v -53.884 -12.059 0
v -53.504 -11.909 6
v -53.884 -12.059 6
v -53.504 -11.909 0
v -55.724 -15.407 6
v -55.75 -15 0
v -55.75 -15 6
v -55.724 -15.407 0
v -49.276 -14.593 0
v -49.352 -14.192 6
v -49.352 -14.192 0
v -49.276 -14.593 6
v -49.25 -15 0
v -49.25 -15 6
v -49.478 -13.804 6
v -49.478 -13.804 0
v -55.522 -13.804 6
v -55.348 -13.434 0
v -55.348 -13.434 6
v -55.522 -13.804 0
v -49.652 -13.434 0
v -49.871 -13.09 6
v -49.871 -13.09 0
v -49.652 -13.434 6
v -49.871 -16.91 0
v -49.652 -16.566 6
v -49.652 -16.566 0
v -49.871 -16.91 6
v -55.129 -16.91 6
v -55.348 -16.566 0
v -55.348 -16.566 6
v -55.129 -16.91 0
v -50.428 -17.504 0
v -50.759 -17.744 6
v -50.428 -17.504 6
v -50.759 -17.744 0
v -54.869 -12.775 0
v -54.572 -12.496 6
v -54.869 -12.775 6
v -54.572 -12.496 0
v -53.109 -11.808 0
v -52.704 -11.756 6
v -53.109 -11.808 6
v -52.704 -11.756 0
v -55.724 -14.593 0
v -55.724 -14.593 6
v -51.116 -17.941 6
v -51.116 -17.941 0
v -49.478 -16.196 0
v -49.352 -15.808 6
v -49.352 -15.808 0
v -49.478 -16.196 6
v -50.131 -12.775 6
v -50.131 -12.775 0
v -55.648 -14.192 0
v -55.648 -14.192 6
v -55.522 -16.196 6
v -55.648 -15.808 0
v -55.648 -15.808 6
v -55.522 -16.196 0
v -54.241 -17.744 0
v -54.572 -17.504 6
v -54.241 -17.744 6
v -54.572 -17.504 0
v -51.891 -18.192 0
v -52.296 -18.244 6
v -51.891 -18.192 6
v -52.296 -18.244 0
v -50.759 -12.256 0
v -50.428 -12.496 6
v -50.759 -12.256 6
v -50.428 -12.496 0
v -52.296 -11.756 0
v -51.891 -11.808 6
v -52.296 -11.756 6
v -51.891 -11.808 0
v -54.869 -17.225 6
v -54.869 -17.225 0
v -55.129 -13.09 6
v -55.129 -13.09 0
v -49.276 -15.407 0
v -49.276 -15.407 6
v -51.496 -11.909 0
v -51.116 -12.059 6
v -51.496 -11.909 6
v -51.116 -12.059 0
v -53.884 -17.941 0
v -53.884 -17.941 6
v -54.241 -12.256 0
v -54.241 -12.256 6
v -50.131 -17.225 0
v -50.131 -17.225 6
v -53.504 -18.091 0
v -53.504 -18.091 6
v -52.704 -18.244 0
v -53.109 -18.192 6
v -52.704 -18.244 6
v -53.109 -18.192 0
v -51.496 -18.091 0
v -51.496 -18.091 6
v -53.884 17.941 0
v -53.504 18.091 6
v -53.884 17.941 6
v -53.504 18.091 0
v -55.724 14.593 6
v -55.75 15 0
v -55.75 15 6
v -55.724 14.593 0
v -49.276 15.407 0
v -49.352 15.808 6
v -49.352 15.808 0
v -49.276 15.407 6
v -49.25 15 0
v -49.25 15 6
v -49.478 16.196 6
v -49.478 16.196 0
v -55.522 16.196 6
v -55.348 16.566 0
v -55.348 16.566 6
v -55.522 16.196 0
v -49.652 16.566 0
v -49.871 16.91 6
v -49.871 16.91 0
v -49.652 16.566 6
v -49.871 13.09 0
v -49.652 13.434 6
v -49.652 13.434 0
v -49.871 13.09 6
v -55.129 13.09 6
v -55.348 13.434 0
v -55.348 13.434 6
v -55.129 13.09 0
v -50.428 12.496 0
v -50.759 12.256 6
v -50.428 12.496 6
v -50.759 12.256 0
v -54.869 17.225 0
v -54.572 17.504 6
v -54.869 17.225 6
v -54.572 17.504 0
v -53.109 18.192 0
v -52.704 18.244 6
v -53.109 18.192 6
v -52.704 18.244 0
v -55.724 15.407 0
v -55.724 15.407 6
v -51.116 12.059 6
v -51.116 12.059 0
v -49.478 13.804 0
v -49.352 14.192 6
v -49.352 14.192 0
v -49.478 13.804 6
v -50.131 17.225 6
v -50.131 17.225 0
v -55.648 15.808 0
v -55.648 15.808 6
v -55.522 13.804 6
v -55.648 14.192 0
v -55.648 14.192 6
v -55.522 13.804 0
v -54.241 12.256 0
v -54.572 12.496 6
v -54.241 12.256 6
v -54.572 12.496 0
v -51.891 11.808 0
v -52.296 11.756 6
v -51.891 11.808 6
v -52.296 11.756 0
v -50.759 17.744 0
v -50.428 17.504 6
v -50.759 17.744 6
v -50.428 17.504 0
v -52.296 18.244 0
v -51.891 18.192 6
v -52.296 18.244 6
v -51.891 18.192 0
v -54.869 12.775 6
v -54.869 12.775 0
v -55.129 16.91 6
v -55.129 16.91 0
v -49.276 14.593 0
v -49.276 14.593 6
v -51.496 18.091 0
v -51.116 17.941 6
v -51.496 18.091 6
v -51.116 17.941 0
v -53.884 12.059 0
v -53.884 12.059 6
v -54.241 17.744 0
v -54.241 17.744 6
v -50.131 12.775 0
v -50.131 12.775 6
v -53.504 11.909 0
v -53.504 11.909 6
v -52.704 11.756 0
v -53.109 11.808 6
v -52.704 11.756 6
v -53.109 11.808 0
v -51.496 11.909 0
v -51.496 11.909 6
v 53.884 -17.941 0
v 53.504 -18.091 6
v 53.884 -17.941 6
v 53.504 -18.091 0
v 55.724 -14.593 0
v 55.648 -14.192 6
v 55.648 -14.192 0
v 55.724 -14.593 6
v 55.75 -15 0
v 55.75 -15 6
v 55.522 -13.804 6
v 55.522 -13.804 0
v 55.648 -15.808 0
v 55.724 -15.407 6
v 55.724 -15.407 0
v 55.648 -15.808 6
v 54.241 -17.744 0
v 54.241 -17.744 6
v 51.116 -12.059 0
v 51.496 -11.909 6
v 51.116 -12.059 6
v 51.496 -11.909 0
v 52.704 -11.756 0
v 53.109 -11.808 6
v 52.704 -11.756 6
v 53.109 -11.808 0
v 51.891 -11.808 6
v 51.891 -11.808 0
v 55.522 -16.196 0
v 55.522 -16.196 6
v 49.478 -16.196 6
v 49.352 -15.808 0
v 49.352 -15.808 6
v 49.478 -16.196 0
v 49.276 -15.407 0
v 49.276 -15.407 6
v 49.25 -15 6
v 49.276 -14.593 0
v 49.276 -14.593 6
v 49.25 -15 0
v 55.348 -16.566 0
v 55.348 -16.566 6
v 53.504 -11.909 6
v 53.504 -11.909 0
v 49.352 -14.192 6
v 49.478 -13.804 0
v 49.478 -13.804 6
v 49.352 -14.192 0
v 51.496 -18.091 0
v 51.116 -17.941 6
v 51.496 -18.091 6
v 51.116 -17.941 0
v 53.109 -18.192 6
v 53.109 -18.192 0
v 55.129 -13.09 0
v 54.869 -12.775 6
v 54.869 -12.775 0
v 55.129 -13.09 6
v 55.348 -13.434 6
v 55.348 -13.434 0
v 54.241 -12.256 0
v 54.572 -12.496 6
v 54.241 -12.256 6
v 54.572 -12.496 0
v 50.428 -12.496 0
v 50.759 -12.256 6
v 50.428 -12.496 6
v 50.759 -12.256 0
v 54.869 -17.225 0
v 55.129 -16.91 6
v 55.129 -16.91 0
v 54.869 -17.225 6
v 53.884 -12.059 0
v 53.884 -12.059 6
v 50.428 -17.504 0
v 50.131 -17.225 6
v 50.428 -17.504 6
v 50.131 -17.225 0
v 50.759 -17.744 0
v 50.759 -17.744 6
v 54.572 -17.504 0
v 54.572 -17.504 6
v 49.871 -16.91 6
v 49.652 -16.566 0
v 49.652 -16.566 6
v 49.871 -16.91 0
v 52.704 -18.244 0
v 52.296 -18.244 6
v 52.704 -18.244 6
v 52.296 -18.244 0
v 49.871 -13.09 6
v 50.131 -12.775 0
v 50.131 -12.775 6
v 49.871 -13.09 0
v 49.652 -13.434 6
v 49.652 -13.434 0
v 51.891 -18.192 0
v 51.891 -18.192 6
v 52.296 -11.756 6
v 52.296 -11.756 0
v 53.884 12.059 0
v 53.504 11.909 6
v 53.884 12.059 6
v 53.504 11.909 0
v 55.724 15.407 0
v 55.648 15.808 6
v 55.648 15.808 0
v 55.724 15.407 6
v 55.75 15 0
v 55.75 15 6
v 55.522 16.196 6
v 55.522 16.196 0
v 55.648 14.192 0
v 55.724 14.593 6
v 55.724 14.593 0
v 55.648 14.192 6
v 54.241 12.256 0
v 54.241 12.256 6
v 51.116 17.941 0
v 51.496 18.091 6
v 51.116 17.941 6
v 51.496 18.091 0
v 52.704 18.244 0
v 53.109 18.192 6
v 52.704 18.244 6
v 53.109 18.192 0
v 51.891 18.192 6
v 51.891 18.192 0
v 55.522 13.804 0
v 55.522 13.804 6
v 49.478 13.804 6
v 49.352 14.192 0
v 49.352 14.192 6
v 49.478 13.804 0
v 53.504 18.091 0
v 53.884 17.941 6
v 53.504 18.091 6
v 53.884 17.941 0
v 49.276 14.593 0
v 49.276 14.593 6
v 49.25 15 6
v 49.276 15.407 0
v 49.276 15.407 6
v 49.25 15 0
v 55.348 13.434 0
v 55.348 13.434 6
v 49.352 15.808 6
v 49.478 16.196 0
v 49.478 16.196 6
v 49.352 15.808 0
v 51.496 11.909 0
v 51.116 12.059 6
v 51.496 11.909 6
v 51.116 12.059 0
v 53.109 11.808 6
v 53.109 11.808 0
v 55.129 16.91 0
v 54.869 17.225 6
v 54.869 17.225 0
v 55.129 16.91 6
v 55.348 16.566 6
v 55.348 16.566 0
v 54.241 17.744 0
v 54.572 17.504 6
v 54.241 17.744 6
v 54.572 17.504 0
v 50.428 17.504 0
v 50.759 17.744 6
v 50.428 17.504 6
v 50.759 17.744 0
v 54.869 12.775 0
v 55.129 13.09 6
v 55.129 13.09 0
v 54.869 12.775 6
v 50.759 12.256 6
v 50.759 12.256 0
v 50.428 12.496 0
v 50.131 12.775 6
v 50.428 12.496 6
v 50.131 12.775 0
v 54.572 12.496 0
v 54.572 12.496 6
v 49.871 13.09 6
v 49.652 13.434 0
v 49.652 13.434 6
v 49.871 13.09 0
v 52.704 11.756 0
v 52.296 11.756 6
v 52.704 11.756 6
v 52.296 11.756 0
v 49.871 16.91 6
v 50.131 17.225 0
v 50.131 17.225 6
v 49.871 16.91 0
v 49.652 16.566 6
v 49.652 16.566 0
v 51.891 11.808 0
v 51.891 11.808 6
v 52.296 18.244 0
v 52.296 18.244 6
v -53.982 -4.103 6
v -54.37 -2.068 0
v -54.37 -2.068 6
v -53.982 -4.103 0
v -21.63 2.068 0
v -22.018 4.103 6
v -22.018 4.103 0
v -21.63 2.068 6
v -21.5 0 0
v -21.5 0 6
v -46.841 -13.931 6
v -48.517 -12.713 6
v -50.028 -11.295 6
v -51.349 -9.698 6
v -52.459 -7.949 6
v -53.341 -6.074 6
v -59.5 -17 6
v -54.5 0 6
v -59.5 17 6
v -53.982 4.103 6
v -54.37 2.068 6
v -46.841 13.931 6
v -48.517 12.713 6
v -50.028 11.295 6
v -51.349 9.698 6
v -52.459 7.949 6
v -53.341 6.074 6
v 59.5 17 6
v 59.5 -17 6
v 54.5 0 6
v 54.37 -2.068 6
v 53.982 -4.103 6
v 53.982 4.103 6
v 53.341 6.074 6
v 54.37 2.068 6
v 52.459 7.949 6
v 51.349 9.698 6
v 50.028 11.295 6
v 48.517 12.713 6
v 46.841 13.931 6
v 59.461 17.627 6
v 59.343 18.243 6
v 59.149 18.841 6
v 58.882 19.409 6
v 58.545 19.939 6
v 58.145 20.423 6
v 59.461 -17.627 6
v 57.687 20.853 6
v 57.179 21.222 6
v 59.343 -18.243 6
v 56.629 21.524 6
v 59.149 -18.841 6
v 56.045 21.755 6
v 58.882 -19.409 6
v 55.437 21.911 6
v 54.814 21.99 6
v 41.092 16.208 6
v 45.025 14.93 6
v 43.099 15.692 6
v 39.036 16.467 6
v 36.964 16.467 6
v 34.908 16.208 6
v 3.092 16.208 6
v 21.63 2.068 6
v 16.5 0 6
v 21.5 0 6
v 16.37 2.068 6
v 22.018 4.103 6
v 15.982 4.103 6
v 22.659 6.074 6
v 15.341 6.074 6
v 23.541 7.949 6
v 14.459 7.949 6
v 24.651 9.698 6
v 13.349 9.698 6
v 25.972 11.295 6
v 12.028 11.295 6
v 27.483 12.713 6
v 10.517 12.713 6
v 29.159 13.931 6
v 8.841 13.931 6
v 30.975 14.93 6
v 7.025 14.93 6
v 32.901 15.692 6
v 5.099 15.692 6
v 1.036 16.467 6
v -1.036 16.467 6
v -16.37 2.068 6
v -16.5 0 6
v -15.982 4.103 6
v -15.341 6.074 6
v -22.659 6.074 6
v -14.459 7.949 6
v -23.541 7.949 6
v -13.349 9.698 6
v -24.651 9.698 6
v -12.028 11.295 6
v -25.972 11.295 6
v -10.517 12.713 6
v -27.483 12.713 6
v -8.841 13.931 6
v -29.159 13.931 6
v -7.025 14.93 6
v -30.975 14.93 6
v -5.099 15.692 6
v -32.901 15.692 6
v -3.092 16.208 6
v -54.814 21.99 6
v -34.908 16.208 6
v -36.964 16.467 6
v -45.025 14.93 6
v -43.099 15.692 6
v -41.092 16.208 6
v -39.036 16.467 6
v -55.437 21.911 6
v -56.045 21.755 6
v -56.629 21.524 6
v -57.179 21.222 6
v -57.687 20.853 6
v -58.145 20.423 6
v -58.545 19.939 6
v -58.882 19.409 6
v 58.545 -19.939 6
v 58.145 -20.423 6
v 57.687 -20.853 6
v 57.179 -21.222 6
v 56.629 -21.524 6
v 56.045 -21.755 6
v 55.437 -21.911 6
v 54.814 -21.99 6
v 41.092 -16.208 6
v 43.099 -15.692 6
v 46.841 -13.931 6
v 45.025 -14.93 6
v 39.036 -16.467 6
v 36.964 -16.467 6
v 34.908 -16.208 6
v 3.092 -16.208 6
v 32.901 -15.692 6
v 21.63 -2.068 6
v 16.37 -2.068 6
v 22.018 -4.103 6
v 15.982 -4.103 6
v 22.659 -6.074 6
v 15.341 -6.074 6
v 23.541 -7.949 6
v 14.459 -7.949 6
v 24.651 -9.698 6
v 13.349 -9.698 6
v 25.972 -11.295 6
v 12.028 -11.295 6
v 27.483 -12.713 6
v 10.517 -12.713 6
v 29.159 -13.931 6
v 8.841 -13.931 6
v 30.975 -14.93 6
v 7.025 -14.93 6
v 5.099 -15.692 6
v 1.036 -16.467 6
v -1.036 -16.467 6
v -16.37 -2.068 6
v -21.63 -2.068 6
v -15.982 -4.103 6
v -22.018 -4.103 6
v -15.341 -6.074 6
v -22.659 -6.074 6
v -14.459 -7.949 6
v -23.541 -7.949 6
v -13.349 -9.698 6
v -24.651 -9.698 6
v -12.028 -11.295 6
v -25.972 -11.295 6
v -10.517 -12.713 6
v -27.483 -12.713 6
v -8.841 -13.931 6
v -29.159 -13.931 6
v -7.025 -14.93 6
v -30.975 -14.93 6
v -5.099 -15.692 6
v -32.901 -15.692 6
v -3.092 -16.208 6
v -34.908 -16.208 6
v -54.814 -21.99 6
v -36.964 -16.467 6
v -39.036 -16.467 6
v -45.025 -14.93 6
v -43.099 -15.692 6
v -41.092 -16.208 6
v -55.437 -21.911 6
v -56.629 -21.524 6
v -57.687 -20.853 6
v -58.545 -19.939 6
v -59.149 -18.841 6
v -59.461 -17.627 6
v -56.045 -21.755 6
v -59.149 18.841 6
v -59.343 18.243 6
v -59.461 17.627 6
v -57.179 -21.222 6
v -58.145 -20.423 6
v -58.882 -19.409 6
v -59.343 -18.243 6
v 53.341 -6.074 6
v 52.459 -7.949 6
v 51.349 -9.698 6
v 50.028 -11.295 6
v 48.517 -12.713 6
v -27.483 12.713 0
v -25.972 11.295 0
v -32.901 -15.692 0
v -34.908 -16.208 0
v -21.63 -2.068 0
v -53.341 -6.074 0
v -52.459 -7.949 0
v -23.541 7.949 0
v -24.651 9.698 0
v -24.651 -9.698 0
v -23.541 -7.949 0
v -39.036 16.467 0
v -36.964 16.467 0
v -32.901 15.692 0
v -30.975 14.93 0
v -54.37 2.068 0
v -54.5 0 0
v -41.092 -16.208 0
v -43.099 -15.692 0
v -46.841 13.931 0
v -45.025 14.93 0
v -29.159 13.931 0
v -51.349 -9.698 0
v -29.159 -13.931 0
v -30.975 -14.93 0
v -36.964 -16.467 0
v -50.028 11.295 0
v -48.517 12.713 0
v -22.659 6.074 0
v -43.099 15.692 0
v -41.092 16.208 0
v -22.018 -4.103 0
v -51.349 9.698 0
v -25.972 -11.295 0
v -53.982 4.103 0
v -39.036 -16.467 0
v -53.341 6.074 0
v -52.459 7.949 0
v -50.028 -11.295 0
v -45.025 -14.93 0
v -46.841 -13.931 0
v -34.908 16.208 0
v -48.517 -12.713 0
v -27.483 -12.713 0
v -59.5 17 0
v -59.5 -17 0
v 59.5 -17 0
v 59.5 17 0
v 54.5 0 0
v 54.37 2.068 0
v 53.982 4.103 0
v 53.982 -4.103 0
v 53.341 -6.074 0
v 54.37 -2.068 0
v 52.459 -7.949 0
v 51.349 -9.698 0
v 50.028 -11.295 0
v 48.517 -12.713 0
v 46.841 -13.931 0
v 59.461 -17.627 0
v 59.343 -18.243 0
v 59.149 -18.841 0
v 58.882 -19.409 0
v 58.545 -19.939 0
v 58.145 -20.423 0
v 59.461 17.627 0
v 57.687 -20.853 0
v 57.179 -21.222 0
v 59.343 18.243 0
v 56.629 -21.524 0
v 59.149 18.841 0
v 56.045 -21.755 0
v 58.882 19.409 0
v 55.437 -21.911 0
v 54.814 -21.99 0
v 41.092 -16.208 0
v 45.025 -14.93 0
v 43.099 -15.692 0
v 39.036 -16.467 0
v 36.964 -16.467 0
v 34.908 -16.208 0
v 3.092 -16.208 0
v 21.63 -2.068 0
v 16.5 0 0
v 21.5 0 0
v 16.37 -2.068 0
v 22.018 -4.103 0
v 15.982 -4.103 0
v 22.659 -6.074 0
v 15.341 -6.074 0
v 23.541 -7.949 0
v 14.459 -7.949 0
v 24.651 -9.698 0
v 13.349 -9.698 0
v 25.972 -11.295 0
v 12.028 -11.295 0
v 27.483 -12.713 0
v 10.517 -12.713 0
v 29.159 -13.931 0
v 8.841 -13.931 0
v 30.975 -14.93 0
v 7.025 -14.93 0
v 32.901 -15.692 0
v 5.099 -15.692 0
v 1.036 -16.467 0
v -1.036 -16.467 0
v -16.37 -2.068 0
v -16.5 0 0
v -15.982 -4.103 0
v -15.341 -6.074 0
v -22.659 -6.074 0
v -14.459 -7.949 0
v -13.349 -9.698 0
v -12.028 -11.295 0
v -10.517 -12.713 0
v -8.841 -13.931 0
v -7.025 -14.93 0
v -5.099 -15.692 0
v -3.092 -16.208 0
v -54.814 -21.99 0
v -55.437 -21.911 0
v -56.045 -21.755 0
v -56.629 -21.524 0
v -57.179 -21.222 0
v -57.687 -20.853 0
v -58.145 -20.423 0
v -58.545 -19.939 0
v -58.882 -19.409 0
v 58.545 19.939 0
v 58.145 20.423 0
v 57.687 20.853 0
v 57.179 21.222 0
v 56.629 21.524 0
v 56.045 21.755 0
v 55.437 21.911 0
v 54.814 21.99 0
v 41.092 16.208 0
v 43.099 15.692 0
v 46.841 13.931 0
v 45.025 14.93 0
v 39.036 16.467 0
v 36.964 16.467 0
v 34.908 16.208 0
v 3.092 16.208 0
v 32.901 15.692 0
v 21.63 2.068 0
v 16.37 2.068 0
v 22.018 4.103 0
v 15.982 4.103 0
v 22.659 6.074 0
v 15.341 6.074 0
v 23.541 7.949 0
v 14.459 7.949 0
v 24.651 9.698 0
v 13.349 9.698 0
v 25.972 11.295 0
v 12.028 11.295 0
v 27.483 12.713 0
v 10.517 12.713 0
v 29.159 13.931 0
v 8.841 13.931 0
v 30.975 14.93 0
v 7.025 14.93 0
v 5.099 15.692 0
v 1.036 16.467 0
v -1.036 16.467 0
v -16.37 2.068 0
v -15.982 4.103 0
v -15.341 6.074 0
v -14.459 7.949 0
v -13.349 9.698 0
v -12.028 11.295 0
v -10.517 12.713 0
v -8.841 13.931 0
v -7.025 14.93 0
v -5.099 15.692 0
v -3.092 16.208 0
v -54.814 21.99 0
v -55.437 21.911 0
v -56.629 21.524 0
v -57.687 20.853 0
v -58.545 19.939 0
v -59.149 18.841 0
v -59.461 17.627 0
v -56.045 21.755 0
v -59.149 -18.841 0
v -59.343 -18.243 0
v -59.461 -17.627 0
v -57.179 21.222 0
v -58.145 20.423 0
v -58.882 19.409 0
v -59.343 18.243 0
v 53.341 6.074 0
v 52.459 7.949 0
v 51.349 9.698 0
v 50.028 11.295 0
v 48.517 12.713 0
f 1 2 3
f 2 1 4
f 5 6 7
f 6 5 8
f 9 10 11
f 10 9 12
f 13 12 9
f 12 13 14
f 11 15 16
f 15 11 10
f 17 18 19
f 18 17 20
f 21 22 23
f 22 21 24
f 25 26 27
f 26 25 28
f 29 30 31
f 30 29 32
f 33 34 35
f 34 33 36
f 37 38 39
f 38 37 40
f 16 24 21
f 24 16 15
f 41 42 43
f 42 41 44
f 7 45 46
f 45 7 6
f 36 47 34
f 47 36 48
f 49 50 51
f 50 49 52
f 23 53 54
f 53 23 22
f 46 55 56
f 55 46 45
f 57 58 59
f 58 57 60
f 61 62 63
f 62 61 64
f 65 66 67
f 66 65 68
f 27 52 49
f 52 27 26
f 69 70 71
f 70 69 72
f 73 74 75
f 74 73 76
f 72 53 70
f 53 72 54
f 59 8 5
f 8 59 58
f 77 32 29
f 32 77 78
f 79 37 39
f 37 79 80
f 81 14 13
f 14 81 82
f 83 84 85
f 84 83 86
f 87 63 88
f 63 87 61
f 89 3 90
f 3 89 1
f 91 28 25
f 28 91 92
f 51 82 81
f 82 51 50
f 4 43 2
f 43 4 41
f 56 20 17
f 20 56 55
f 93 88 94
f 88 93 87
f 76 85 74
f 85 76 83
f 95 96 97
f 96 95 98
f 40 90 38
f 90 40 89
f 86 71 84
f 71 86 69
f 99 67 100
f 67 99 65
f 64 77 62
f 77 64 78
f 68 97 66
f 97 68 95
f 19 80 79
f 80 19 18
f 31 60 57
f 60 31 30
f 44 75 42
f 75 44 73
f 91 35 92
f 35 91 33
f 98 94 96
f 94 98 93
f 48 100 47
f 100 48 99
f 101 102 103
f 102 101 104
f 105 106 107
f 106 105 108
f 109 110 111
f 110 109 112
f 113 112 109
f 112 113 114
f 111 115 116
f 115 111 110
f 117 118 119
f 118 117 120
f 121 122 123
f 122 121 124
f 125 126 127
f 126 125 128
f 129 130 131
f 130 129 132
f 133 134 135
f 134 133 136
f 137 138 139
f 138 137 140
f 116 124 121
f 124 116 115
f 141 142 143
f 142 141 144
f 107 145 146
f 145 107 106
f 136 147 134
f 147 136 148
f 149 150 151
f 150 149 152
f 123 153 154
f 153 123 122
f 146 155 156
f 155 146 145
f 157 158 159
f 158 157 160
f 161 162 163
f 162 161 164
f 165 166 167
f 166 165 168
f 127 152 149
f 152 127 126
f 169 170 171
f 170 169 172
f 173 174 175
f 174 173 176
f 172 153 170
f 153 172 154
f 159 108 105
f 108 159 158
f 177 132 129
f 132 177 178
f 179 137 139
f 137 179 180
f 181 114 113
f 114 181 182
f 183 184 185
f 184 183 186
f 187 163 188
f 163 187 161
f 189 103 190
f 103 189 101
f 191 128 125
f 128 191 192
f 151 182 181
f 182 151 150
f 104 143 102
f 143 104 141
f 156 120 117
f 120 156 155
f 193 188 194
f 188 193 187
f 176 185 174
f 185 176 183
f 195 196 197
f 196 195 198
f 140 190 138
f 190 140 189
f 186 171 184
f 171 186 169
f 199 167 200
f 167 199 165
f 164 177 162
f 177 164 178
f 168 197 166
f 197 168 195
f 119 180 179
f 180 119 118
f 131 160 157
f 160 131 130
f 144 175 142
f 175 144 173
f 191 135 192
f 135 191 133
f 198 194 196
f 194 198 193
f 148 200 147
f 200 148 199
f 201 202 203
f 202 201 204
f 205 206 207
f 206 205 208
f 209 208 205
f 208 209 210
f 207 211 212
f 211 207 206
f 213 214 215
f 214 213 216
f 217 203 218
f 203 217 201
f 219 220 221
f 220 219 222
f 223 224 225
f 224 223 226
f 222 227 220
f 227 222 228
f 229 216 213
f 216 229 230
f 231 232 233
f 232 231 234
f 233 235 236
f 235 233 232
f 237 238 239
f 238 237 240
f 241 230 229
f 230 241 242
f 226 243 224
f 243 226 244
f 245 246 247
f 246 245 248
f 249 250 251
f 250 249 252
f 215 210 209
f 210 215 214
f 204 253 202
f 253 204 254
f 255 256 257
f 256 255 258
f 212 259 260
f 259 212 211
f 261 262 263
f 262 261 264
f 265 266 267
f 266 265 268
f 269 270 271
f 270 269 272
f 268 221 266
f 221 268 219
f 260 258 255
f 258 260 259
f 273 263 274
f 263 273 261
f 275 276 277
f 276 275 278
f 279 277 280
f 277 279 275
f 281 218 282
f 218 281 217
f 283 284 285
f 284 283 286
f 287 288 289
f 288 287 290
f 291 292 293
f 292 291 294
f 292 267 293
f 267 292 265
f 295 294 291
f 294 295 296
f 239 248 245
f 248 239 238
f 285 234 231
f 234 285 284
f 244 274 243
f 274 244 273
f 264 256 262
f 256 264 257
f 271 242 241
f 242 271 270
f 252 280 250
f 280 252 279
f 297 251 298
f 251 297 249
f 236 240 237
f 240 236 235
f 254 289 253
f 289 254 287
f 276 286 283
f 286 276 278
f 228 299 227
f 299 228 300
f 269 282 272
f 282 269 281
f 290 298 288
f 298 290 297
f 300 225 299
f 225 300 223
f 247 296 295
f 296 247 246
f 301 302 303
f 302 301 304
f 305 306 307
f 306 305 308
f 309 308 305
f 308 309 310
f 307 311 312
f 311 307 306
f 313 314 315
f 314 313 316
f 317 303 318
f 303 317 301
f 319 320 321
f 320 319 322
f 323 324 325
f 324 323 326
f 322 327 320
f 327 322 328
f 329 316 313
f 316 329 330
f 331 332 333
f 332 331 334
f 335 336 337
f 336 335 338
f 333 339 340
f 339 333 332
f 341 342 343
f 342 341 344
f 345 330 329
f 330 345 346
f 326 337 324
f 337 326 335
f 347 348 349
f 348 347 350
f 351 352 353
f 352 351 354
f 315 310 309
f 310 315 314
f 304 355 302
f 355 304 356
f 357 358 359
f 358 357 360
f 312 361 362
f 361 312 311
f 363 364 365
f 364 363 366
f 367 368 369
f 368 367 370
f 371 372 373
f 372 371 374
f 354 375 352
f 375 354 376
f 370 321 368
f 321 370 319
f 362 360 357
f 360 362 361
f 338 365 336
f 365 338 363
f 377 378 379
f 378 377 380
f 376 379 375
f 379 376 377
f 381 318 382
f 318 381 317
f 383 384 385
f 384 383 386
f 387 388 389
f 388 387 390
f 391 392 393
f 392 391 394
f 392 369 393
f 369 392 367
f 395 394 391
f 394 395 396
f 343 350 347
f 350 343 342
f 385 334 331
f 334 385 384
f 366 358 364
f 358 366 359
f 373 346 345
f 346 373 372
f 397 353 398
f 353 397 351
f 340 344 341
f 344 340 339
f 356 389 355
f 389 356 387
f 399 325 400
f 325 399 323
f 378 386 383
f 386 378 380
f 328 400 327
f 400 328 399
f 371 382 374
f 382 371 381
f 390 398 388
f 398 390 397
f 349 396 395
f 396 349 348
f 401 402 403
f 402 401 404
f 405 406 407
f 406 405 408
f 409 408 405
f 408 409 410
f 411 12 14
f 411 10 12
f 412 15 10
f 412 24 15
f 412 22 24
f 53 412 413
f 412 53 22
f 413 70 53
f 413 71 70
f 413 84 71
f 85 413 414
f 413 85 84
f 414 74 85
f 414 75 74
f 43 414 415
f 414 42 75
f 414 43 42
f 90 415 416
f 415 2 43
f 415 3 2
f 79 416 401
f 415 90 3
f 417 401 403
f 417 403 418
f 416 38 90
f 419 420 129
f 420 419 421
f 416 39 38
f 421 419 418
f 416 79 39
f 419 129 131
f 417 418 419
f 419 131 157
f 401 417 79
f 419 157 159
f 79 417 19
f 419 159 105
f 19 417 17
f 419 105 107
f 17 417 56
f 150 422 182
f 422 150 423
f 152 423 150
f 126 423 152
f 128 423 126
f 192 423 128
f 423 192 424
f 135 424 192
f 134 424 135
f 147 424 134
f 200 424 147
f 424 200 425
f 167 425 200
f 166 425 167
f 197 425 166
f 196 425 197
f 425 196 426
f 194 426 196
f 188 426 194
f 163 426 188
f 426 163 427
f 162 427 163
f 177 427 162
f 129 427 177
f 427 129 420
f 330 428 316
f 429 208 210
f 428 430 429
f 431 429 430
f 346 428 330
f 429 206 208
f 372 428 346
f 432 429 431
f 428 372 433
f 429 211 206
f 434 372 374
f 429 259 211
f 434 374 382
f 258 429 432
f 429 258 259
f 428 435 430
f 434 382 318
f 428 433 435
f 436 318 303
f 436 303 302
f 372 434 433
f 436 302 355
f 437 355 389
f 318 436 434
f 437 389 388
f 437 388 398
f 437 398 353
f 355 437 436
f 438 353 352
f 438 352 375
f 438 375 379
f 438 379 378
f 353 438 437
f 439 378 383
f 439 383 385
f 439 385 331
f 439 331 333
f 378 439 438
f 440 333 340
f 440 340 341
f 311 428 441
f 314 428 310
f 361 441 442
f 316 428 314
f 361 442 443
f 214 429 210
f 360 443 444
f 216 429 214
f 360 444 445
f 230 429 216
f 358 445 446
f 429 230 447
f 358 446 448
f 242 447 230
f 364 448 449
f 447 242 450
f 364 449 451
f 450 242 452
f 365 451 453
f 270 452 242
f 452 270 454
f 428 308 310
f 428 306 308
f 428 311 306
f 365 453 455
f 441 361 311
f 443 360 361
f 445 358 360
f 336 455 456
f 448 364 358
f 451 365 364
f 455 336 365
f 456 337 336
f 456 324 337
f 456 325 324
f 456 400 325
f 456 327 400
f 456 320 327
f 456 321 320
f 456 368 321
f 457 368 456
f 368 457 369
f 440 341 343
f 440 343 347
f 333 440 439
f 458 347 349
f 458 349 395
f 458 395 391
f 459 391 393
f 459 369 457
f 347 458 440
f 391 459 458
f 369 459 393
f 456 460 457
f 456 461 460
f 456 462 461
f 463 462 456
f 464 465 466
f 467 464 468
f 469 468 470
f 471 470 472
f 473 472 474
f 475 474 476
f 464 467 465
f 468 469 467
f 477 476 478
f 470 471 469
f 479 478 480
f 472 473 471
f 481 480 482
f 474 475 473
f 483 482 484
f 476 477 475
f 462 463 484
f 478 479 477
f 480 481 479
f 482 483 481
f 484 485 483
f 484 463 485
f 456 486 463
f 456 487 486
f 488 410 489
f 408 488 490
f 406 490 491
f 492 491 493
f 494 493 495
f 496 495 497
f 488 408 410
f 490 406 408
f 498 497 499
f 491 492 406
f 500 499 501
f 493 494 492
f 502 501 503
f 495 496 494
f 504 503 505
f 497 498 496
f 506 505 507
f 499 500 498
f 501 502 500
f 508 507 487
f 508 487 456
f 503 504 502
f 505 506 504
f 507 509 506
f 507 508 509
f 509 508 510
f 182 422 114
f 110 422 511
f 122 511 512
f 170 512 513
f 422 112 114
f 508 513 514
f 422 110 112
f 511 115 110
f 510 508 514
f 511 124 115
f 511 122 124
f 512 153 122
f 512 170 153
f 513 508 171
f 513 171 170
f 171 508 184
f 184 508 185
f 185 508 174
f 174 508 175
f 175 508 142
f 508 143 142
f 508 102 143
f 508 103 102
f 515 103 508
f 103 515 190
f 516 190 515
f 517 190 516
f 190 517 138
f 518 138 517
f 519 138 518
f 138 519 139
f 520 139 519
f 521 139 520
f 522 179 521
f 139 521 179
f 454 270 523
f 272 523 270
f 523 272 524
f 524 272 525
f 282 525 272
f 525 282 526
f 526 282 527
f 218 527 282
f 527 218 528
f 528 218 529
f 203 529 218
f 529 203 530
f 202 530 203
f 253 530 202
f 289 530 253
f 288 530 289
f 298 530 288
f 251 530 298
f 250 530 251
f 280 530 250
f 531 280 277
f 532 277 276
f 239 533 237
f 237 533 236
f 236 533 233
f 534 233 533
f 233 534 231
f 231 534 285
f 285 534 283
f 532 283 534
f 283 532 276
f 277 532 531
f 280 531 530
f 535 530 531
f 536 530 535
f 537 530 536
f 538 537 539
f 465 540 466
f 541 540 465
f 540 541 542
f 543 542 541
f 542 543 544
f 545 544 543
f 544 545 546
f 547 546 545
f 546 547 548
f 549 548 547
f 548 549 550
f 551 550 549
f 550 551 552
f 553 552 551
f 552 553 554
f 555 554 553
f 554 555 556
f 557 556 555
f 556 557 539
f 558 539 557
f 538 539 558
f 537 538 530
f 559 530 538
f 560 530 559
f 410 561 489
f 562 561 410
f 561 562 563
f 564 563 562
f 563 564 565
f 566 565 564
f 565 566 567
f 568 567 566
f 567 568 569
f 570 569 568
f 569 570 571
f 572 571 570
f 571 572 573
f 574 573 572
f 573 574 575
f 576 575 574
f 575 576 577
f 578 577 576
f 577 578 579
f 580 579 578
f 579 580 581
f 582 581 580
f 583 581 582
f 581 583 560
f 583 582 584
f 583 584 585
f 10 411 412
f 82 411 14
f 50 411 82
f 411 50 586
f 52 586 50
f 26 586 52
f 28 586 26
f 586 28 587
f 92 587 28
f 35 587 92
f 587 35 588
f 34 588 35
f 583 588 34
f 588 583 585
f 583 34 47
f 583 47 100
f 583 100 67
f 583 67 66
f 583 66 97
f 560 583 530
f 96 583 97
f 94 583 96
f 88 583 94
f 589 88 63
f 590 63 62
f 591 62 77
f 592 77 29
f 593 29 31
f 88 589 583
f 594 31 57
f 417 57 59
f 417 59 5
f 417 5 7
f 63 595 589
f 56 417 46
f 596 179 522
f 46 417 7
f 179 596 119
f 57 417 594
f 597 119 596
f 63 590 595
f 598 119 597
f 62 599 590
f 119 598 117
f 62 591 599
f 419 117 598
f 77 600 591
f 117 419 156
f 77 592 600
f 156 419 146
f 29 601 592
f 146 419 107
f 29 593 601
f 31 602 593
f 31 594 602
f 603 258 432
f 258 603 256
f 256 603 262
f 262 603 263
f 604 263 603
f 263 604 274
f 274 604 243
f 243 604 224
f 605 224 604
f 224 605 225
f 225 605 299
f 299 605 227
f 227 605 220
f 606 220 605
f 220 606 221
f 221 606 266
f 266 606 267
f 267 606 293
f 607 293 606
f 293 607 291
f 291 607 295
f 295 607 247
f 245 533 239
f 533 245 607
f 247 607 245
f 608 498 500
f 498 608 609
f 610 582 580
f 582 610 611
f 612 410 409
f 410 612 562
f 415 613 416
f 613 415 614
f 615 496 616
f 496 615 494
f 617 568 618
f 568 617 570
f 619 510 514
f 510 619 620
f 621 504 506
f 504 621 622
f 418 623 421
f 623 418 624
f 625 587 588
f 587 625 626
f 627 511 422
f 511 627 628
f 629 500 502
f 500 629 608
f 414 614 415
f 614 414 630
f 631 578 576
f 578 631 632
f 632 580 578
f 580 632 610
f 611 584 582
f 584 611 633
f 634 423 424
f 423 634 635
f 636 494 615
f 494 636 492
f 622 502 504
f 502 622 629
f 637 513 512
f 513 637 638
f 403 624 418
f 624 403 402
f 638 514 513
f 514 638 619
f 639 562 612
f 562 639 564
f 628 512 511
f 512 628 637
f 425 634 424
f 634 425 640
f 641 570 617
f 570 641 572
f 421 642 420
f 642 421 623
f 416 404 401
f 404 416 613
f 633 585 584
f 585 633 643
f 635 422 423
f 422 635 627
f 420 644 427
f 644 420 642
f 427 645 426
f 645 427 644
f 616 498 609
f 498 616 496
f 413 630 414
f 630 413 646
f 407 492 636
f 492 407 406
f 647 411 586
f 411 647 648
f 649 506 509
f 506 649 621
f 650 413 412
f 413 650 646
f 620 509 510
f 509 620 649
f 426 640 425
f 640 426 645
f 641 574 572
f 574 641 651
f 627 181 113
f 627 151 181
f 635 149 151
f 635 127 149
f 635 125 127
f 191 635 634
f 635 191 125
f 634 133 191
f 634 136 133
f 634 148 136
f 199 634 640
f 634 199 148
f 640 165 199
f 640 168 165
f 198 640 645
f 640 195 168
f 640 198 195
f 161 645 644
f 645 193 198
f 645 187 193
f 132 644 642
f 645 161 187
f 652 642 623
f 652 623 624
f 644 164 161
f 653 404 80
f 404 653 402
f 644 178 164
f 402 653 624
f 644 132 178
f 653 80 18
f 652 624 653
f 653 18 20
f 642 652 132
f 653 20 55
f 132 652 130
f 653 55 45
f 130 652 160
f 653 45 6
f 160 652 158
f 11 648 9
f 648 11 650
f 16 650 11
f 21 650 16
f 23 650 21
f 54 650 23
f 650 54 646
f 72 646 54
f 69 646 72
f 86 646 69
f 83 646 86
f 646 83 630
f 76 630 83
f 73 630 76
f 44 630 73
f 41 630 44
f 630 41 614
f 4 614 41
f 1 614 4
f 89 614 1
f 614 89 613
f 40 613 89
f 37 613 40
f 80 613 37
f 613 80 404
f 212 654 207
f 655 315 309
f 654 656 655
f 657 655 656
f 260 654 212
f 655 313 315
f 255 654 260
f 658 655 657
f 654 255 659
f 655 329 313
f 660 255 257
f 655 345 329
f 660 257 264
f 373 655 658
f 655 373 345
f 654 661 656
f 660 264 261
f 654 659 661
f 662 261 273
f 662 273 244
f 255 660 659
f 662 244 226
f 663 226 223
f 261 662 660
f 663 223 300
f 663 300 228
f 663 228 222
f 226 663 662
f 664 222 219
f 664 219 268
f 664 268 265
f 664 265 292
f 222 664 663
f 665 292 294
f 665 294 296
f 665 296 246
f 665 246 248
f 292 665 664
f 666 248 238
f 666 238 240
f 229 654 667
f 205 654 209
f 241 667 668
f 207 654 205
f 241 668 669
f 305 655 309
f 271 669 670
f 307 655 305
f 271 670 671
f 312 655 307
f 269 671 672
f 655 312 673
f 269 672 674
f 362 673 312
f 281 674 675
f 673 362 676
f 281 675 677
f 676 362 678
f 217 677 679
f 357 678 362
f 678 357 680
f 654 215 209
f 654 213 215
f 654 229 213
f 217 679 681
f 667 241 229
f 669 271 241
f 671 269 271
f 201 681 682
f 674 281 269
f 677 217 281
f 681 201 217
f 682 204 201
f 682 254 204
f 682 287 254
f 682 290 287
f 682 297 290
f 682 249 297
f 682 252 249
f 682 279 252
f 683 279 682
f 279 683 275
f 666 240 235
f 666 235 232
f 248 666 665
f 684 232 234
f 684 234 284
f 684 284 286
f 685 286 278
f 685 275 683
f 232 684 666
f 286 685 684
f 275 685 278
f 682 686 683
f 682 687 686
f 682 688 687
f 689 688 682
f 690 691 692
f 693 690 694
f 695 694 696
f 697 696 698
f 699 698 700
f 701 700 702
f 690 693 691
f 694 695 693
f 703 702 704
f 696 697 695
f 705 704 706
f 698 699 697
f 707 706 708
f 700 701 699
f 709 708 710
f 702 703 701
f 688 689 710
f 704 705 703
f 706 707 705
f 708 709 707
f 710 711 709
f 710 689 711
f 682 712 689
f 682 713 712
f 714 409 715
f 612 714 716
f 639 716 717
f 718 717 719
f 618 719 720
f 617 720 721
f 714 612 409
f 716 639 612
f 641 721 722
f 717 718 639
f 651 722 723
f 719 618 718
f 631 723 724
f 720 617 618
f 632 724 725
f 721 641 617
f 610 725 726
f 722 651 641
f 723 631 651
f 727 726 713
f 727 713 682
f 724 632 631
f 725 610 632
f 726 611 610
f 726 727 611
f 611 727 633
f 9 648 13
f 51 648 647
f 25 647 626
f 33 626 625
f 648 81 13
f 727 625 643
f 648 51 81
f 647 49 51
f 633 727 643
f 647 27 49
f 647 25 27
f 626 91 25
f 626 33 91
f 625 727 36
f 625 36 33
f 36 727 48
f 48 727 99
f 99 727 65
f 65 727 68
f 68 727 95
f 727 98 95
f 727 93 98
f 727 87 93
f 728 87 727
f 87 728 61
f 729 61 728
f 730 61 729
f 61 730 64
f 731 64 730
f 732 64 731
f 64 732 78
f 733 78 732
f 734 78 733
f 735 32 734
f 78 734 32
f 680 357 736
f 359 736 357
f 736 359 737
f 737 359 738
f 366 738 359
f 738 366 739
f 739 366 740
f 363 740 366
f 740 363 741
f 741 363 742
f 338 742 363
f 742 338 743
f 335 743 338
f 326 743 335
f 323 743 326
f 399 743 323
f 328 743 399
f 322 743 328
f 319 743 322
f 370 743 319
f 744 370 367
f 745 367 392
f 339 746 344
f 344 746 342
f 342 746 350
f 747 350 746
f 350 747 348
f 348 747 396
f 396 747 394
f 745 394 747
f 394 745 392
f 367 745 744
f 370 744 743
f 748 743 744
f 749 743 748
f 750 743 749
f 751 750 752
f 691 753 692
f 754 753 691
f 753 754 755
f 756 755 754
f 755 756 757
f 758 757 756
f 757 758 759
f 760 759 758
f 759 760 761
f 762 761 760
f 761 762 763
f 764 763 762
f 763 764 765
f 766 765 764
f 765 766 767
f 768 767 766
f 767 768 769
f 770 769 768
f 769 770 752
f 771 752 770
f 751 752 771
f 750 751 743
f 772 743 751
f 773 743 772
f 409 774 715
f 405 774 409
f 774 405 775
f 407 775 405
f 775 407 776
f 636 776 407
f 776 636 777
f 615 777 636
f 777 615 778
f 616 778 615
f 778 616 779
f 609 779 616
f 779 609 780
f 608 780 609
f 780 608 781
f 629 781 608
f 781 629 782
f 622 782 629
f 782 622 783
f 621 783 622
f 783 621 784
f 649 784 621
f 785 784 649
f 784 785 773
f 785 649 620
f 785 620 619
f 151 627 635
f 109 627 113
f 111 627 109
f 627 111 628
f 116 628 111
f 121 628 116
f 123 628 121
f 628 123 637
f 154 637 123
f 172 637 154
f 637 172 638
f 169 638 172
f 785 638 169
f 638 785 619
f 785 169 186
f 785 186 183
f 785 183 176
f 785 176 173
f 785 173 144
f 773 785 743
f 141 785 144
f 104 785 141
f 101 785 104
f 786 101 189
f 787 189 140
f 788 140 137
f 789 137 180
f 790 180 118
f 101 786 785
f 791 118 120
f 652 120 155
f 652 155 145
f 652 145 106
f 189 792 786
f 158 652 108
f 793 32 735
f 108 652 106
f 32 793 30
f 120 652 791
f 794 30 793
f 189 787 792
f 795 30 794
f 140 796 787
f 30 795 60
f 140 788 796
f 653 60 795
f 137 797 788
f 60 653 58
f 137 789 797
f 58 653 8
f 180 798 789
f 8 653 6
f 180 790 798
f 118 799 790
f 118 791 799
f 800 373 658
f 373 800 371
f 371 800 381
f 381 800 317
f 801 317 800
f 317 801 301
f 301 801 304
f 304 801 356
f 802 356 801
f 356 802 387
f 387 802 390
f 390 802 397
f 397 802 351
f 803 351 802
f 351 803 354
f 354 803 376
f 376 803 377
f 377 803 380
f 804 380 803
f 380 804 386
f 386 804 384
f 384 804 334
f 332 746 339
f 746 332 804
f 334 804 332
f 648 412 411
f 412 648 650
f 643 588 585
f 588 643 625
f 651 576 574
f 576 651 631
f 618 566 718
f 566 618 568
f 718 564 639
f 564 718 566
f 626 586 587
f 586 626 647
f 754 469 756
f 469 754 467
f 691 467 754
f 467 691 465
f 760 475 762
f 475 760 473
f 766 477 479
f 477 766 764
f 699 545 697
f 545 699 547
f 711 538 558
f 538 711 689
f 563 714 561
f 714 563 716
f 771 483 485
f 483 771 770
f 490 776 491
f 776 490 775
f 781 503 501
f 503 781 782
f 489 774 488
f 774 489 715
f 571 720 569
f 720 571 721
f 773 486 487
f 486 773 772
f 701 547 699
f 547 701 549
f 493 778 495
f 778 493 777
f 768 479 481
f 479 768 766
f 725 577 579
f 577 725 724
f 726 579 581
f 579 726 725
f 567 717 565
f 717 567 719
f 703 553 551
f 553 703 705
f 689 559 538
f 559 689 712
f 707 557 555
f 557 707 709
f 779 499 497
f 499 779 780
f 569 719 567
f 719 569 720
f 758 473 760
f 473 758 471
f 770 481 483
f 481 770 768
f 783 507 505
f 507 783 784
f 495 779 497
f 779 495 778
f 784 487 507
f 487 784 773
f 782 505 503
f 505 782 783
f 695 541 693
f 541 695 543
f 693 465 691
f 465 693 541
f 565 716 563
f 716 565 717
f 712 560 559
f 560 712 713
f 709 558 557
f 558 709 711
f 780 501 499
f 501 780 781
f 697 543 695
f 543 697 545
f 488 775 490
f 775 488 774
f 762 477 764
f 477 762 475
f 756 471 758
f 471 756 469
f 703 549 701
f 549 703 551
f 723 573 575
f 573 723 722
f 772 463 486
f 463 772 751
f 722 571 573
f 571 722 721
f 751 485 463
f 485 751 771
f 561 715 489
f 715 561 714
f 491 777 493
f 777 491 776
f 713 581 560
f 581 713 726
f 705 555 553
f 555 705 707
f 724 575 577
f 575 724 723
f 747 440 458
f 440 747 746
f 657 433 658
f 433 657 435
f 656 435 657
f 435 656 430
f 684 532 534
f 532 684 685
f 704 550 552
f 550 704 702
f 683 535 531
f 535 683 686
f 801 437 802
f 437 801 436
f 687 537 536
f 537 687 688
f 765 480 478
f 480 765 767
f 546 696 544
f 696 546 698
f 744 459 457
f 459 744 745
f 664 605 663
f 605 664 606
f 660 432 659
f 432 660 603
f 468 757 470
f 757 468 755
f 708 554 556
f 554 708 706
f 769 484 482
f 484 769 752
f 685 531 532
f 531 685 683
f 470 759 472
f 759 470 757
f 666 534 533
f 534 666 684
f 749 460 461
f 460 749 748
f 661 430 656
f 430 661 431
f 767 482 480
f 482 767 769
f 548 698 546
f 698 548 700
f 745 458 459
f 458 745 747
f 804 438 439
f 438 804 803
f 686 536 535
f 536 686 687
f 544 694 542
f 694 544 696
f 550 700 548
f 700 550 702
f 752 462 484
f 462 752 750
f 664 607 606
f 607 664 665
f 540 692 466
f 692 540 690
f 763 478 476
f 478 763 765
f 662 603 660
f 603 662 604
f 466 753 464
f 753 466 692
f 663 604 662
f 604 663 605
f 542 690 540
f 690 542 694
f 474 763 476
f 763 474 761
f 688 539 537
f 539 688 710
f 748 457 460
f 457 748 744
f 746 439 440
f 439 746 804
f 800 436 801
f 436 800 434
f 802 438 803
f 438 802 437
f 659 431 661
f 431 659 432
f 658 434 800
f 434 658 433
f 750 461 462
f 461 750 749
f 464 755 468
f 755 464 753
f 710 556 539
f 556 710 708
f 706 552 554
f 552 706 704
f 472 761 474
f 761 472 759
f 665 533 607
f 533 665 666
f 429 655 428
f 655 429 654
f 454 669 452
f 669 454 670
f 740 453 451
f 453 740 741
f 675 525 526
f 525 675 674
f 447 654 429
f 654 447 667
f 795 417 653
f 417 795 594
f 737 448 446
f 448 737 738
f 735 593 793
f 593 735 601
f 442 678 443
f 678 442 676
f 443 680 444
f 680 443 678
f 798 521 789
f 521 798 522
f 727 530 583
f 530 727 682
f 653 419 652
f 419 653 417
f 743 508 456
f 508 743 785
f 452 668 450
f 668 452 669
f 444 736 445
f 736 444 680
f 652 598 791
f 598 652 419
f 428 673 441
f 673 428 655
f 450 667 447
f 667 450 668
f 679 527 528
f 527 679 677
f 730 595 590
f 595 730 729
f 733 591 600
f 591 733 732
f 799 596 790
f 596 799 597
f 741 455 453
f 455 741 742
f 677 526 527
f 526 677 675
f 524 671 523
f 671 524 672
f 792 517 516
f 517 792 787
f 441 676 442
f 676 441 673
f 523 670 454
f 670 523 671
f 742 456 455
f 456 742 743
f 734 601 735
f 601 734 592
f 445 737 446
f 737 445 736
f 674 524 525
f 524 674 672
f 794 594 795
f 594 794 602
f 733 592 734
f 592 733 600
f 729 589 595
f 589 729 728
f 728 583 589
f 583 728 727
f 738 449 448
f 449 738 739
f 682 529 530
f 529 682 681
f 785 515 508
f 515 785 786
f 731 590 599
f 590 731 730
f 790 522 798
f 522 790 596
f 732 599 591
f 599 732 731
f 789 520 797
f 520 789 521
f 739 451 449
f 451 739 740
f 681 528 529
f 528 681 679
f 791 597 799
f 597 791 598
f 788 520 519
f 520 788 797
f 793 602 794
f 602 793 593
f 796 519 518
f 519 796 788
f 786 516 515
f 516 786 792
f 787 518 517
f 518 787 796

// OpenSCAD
$fn = 50;


difference() {
	union() {
		hull() {
			translate(v = [-54.5000000000, 17.0000000000, 0]) {
				cylinder(h = 6, r = 5);
			}
			translate(v = [54.5000000000, 17.0000000000, 0]) {
				cylinder(h = 6, r = 5);
			}
			translate(v = [-54.5000000000, -17.0000000000, 0]) {
				cylinder(h = 6, r = 5);
			}
			translate(v = [54.5000000000, -17.0000000000, 0]) {
				cylinder(h = 6, r = 5);
			}
		}
	}
	union() {
		#translate(v = [-52.5000000000, -15.0000000000, -100.0000000000]) {
			cylinder(h = 200, r = 3.2500000000);
		}
		#translate(v = [-52.5000000000, 15.0000000000, -100.0000000000]) {
			cylinder(h = 200, r = 3.2500000000);
		}
		#translate(v = [52.5000000000, -15.0000000000, -100.0000000000]) {
			cylinder(h = 200, r = 3.2500000000);
		}
		#translate(v = [52.5000000000, 15.0000000000, -100.0000000000]) {
			cylinder(h = 200, r = 3.2500000000);
		}
		#translate(v = [-38.0000000000, 0, 0]) {
			cylinder(h = 6, r = 16.5000000000);
		}
		#cylinder(h = 6, r = 16.5000000000);
		#translate(v = [38.0000000000, 0, 0]) {
			cylinder(h = 6, r = 16.5000000000);
		}
	}
}
